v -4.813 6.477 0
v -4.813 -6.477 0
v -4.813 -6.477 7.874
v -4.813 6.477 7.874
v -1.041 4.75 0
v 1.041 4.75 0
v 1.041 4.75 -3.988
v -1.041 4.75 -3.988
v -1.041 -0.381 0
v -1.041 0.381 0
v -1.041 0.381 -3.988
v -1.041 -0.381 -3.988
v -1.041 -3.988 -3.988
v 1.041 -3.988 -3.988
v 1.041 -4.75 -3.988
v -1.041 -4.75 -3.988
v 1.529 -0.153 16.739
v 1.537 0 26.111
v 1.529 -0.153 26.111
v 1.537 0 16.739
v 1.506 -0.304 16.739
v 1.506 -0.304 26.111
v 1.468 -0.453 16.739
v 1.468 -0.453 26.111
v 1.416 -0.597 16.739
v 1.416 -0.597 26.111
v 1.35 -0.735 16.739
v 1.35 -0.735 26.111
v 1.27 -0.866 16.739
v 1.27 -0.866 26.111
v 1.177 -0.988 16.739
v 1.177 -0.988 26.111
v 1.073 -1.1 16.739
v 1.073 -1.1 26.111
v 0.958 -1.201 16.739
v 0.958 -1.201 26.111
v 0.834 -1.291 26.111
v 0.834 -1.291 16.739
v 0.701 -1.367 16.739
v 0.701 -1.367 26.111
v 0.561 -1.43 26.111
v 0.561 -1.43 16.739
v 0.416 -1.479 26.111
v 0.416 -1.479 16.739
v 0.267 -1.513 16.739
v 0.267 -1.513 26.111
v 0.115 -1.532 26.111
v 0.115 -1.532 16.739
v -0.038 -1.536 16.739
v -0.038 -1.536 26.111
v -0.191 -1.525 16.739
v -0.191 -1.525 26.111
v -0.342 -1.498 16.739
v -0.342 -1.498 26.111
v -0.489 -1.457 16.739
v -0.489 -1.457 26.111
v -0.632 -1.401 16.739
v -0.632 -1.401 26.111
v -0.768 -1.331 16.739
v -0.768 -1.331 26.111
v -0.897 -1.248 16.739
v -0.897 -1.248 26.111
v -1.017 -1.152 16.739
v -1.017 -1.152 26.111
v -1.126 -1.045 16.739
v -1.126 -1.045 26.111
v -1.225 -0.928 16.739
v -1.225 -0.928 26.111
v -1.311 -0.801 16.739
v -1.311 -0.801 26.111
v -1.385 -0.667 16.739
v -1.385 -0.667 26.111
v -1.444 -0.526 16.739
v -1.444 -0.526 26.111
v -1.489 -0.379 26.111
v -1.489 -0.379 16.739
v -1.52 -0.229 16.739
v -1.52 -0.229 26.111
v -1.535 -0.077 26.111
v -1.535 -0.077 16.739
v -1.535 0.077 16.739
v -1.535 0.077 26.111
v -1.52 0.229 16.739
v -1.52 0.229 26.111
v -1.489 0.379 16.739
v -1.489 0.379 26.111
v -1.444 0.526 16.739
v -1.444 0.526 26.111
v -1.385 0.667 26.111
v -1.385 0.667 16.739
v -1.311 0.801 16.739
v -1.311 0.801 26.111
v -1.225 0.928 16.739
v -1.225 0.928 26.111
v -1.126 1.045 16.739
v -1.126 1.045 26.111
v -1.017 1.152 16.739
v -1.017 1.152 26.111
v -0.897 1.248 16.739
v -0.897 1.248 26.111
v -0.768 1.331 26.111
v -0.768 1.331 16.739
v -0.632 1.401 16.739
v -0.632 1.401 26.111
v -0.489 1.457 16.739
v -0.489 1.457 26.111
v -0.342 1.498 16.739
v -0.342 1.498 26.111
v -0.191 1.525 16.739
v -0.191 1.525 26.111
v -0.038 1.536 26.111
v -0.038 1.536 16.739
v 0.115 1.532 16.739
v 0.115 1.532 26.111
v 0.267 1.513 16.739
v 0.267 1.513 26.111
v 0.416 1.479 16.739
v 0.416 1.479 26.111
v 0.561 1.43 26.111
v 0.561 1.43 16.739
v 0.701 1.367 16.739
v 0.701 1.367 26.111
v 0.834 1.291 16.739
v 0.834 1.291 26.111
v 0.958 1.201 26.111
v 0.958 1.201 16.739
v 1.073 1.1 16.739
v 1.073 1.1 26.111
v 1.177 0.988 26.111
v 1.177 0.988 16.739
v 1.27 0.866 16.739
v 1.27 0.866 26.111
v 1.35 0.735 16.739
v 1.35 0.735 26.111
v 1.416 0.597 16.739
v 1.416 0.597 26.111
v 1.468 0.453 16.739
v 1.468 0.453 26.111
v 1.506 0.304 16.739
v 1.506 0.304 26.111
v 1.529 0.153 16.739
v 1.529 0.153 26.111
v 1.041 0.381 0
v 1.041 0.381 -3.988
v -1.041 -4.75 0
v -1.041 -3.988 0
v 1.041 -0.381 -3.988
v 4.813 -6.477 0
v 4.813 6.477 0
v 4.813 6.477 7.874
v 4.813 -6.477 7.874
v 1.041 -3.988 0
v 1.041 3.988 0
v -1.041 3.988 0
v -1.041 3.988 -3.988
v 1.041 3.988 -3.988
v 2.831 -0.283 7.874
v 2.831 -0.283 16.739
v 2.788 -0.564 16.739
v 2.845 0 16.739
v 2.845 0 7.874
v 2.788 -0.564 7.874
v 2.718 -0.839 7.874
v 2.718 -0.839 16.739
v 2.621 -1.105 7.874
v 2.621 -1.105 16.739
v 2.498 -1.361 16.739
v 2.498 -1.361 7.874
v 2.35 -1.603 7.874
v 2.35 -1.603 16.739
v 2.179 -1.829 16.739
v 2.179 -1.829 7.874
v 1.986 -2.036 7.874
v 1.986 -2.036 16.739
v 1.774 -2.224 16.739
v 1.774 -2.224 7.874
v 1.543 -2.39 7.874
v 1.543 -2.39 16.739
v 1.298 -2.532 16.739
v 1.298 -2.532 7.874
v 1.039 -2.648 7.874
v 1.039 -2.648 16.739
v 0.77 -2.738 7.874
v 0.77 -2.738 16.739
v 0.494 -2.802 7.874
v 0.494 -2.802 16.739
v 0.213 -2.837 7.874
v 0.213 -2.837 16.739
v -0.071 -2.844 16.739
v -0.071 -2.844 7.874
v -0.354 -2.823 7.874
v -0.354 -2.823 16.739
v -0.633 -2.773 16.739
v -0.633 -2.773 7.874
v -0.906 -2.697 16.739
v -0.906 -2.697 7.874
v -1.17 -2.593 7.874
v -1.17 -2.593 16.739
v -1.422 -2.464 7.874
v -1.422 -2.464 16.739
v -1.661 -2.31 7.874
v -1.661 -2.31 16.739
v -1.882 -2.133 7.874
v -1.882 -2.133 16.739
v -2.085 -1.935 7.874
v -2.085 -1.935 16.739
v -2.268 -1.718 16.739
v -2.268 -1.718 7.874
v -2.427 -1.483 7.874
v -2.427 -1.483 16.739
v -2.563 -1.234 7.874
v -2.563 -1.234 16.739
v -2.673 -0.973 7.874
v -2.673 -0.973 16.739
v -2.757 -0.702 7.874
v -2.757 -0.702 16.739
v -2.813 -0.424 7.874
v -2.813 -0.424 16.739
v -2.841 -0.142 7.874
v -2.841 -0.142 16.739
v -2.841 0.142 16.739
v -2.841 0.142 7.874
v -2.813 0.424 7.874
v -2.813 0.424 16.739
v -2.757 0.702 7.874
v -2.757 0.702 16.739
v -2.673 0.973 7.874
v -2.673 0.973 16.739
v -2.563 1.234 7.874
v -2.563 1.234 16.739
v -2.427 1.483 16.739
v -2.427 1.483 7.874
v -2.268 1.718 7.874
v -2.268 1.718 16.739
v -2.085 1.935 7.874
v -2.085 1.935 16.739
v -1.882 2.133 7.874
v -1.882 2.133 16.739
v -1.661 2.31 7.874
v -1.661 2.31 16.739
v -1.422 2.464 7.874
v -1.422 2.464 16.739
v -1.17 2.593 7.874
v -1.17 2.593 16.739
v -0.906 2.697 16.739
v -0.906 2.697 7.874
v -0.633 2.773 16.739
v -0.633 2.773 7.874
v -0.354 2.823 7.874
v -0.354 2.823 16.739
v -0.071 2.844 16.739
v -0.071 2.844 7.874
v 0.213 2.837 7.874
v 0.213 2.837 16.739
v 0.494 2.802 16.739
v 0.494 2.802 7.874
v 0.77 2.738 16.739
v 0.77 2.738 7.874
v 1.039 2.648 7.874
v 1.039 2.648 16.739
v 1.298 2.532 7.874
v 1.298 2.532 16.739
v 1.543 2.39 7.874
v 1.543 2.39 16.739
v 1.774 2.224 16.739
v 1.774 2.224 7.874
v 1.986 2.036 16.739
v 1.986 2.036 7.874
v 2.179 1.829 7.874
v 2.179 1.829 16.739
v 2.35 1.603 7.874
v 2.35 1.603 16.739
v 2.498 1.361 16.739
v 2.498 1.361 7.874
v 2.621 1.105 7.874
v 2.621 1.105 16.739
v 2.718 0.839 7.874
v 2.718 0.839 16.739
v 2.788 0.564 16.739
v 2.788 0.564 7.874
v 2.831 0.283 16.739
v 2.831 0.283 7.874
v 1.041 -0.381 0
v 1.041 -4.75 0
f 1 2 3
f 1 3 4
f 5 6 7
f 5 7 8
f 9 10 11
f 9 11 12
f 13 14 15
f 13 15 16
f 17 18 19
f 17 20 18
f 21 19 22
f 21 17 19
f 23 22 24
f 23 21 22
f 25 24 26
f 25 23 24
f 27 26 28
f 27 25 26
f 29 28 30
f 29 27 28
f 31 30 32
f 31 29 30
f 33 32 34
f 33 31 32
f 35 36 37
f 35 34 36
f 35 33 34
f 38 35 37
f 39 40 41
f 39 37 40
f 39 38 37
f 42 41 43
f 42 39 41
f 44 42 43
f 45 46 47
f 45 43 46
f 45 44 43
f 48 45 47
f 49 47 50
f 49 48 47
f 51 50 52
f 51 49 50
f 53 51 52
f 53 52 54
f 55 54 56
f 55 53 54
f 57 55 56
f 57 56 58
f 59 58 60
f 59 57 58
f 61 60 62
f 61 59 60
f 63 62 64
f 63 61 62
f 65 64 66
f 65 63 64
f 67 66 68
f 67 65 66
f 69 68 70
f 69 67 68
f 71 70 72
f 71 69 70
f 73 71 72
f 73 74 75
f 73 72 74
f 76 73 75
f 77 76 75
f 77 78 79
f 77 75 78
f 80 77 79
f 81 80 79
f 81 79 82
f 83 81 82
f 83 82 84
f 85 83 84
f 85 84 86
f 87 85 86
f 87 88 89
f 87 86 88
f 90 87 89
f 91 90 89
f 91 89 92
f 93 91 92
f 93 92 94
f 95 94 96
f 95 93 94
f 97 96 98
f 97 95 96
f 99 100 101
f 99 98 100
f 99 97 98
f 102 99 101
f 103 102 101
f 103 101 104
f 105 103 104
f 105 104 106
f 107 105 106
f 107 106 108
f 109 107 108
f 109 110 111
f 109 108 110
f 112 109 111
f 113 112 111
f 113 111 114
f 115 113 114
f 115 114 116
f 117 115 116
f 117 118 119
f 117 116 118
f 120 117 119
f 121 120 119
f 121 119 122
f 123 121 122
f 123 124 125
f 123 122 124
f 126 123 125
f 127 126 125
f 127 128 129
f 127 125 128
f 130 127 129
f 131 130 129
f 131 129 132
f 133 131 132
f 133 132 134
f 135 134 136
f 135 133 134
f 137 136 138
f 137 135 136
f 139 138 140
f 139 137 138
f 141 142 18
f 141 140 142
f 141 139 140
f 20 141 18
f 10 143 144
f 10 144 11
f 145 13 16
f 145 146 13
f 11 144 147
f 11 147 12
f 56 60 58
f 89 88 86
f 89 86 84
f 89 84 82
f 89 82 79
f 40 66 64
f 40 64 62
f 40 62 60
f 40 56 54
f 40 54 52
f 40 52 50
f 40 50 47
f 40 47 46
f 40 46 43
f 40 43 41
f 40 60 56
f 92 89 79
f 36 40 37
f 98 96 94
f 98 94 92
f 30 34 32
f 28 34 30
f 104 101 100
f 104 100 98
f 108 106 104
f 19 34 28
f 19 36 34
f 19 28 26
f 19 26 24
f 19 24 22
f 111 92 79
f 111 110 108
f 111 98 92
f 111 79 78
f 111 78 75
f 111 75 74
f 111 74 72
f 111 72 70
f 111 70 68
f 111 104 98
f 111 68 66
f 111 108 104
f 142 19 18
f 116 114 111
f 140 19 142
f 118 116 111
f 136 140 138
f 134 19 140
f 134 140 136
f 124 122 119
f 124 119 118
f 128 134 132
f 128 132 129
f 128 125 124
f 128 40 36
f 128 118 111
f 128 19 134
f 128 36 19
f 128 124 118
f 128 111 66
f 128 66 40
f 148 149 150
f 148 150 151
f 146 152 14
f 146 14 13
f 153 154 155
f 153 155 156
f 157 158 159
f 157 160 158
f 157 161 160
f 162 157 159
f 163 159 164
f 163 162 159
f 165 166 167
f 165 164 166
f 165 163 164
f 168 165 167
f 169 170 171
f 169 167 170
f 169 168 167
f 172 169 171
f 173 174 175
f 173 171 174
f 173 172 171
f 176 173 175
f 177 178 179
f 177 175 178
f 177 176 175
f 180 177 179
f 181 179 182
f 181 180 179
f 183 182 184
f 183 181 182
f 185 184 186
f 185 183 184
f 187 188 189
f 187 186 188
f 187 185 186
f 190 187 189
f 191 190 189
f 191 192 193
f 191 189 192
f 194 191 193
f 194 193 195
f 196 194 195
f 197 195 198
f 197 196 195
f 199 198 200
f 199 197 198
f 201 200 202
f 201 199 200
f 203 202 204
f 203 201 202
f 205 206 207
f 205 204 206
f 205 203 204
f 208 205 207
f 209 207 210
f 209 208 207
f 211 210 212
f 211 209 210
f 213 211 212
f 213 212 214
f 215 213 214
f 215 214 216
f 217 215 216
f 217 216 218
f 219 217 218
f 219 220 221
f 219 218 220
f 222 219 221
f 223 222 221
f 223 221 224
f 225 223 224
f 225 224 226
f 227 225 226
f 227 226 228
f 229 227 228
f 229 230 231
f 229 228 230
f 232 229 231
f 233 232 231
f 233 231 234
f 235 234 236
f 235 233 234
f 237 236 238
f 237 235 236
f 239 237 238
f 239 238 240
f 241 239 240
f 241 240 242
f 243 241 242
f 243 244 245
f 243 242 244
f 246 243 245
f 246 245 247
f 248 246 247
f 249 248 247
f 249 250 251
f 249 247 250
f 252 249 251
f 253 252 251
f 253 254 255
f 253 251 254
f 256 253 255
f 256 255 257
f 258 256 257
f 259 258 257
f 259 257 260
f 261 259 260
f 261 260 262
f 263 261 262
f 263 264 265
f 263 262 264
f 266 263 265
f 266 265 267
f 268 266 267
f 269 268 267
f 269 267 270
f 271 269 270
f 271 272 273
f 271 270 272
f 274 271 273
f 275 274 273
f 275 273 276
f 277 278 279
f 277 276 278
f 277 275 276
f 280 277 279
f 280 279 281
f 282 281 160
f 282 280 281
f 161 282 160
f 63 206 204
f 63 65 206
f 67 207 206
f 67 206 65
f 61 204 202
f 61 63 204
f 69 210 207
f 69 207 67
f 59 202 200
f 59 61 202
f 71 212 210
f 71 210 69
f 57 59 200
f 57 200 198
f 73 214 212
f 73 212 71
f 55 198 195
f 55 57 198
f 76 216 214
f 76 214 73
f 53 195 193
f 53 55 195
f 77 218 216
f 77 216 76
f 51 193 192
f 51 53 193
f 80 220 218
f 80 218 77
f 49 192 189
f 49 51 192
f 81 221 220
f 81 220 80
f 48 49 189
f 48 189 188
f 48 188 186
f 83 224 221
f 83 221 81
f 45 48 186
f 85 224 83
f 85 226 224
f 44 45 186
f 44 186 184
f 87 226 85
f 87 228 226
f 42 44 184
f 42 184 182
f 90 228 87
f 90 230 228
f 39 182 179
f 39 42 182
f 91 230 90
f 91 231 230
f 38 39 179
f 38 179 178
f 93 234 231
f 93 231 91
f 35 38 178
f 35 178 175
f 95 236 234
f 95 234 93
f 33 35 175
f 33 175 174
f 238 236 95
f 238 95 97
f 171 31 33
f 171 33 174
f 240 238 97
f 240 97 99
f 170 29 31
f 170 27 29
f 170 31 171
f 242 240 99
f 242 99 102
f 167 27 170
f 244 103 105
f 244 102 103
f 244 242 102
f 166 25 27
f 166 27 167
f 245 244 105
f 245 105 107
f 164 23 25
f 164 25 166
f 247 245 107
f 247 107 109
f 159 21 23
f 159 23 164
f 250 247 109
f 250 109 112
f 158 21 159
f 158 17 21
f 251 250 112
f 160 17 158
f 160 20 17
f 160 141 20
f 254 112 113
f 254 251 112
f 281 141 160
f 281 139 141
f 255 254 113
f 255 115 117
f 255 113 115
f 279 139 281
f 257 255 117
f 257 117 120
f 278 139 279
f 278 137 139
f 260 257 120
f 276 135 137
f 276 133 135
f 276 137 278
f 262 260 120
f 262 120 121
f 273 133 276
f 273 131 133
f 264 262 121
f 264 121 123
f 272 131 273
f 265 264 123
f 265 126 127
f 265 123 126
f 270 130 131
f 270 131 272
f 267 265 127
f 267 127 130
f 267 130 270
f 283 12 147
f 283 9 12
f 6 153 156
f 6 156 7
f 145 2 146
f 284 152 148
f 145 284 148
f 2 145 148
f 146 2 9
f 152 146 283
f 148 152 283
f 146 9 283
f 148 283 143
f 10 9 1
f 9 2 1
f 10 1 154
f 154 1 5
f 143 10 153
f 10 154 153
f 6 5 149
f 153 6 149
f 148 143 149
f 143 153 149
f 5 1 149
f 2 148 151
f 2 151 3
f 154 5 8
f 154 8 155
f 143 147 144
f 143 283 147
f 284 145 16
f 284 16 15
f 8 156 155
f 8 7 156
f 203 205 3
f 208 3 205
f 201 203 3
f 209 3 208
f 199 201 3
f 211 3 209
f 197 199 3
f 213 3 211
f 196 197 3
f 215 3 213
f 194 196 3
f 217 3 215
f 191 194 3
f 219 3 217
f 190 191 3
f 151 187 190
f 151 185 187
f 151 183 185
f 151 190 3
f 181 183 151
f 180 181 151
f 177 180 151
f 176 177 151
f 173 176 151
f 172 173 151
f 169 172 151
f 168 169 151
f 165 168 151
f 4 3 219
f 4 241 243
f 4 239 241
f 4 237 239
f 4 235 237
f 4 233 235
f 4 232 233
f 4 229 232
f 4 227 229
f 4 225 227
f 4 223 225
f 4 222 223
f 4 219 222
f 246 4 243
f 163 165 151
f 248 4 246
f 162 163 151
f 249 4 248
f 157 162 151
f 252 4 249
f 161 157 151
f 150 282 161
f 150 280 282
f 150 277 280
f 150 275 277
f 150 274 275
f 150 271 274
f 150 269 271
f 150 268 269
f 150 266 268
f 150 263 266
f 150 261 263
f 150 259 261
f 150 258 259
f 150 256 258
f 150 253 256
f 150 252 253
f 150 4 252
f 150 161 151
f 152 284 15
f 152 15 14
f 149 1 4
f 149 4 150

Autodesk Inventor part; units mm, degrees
ref_plane "YZ Plane" through (0, 0, 0) normal (1, 0, 0) x (0, 1, 0)
ref_plane "XZ Plane" through (0, 0, 0) normal (0, 1, 0) x (-1, 0, 0)
ref_plane "XY Plane" through (0, 0, 0) normal (0, 0, 1) x (1, 0, 0)
sketch "Sketch1" plane through (0, 0, 0) normal (0, 0, 1) x (1, 0, 0)
  line L0 (-4.8133, 6.477) -> (4.8133, 6.477)
  line L1 (4.8133, 6.477) -> (4.8133, -6.477)
  line L2 (4.8133, -6.477) -> (-4.8133, -6.477)
  line L3 (-4.8133, -6.477) -> (-4.8133, 6.477)
  line L4 (-4.8133, 6.477) -> (4.8133, -6.477) construction
  line L5 (4.8133, 6.477) -> (-4.8133, -6.477) construction
  point P0 (0, 0)
extrude "Extrusion1" add sketch "Sketch1" along normal blind 7.874
sketch "Sketch2" plane through (0, 0, 0) normal (0, 0, -1) x (-1, 0, 0)
  line L0 (-1.0414, 4.7498) -> (1.0414, 4.7498)
  line L1 (1.0414, 4.7498) -> (1.0414, 3.9878)
  line L2 (1.0414, 3.9878) -> (-1.0414, 3.9878)
  line L3 (-1.0414, 3.9878) -> (-1.0414, 4.7498)
  line L4 (-1.0414, 4.7498) -> (1.0414, 3.9878) construction
  line L5 (1.0414, 4.7498) -> (-1.0414, 3.9878) construction
  line L6 (4.8133, 6.477) -> (-4.8133, 6.477) projected
  point P0 (0, 0)
  point P1 (0, 4.3688)
  dimension "d7" = 2.0828
  dimension "d8" = 0.762
  dimension "d28" = 1.7272
extrude "Extrusion2" add sketch "Sketch2" along normal blind 3.9878
sketch "Sketch3" plane through (0, 0, 0) normal (0, 0, -1) x (-1, 0, 0)
  line L0 (-1.0414, 0.381) -> (1.0414, 0.381)
  line L1 (1.0414, 0.381) -> (1.0414, -0.381)
  line L2 (1.0414, -0.381) -> (-1.0414, -0.381)
  line L3 (-1.0414, -0.381) -> (-1.0414, 0.381)
  line L4 (-1.0414, 0.381) -> (1.0414, -0.381) construction
  line L5 (1.0414, 0.381) -> (-1.0414, -0.381) construction
  line L6 (-1.0414, 3.9878) -> (1.0414, 3.9878) projected
  line L7 (4.8133, 6.477) -> (-4.8133, 6.477) projected
  line L8 (1.0414, 4.7498) -> (-1.0414, 4.7498) projected
  point P0 (0, 0)
  point P1 (0, 0)
  dimension "d13" = 2.0828
  dimension "d15" = 0.762
  dimension "d16" = 3.6068
  dimension "d18" = 1.7272
extrude "Extrusion3" add sketch "Sketch3" along normal blind 3.9878
sketch "Sketch4" plane through (0, 0, 0) normal (0, 0, -1) x (-1, 0, 0)
  line L0 (-1.0414, -3.9878) -> (1.0414, -3.9878)
  line L1 (1.0414, -3.9878) -> (1.0414, -4.7498)
  line L2 (1.0414, -4.7498) -> (-1.0414, -4.7498)
  line L3 (-1.0414, -4.7498) -> (-1.0414, -3.9878)
  line L4 (-1.0414, -3.9878) -> (1.0414, -4.7498) construction
  line L5 (1.0414, -3.9878) -> (-1.0414, -4.7498) construction
  line L6 (-1.0414, -0.381) -> (1.0414, -0.381) projected
  line L7 (-4.8133, -6.477) -> (4.8133, -6.477) projected
  point P0 (0, 0)
  point P1 (0, -4.3688)
  dimension "d24" = 0.762
  dimension "d25" = 3.6068
  dimension "d27" = 2.0828
extrude "Extrusion4" add sketch "Sketch4" along normal blind 3.9878
sketch "Sketch5" plane through (0, 0, 7.874) normal (0, 0, 1) x (1, 0, 0)
  circle A0 centre (0, 0) radius 2.8448
  dimension "d31" = 5.6896
extrude "Extrusion5" add sketch "Sketch5" along normal blind 8.8646
sketch "Sketch6" plane through (0, 0, 16.7386) normal (0, 0, 1) x (1, 0, 0)
  circle A0 centre (0, 0) radius 1.5367
  dimension "d34" = 3.0734
extrude "Extrusion6" add sketch "Sketch6" along normal blind 9.3726
properties part number "Mini toggle switch"
